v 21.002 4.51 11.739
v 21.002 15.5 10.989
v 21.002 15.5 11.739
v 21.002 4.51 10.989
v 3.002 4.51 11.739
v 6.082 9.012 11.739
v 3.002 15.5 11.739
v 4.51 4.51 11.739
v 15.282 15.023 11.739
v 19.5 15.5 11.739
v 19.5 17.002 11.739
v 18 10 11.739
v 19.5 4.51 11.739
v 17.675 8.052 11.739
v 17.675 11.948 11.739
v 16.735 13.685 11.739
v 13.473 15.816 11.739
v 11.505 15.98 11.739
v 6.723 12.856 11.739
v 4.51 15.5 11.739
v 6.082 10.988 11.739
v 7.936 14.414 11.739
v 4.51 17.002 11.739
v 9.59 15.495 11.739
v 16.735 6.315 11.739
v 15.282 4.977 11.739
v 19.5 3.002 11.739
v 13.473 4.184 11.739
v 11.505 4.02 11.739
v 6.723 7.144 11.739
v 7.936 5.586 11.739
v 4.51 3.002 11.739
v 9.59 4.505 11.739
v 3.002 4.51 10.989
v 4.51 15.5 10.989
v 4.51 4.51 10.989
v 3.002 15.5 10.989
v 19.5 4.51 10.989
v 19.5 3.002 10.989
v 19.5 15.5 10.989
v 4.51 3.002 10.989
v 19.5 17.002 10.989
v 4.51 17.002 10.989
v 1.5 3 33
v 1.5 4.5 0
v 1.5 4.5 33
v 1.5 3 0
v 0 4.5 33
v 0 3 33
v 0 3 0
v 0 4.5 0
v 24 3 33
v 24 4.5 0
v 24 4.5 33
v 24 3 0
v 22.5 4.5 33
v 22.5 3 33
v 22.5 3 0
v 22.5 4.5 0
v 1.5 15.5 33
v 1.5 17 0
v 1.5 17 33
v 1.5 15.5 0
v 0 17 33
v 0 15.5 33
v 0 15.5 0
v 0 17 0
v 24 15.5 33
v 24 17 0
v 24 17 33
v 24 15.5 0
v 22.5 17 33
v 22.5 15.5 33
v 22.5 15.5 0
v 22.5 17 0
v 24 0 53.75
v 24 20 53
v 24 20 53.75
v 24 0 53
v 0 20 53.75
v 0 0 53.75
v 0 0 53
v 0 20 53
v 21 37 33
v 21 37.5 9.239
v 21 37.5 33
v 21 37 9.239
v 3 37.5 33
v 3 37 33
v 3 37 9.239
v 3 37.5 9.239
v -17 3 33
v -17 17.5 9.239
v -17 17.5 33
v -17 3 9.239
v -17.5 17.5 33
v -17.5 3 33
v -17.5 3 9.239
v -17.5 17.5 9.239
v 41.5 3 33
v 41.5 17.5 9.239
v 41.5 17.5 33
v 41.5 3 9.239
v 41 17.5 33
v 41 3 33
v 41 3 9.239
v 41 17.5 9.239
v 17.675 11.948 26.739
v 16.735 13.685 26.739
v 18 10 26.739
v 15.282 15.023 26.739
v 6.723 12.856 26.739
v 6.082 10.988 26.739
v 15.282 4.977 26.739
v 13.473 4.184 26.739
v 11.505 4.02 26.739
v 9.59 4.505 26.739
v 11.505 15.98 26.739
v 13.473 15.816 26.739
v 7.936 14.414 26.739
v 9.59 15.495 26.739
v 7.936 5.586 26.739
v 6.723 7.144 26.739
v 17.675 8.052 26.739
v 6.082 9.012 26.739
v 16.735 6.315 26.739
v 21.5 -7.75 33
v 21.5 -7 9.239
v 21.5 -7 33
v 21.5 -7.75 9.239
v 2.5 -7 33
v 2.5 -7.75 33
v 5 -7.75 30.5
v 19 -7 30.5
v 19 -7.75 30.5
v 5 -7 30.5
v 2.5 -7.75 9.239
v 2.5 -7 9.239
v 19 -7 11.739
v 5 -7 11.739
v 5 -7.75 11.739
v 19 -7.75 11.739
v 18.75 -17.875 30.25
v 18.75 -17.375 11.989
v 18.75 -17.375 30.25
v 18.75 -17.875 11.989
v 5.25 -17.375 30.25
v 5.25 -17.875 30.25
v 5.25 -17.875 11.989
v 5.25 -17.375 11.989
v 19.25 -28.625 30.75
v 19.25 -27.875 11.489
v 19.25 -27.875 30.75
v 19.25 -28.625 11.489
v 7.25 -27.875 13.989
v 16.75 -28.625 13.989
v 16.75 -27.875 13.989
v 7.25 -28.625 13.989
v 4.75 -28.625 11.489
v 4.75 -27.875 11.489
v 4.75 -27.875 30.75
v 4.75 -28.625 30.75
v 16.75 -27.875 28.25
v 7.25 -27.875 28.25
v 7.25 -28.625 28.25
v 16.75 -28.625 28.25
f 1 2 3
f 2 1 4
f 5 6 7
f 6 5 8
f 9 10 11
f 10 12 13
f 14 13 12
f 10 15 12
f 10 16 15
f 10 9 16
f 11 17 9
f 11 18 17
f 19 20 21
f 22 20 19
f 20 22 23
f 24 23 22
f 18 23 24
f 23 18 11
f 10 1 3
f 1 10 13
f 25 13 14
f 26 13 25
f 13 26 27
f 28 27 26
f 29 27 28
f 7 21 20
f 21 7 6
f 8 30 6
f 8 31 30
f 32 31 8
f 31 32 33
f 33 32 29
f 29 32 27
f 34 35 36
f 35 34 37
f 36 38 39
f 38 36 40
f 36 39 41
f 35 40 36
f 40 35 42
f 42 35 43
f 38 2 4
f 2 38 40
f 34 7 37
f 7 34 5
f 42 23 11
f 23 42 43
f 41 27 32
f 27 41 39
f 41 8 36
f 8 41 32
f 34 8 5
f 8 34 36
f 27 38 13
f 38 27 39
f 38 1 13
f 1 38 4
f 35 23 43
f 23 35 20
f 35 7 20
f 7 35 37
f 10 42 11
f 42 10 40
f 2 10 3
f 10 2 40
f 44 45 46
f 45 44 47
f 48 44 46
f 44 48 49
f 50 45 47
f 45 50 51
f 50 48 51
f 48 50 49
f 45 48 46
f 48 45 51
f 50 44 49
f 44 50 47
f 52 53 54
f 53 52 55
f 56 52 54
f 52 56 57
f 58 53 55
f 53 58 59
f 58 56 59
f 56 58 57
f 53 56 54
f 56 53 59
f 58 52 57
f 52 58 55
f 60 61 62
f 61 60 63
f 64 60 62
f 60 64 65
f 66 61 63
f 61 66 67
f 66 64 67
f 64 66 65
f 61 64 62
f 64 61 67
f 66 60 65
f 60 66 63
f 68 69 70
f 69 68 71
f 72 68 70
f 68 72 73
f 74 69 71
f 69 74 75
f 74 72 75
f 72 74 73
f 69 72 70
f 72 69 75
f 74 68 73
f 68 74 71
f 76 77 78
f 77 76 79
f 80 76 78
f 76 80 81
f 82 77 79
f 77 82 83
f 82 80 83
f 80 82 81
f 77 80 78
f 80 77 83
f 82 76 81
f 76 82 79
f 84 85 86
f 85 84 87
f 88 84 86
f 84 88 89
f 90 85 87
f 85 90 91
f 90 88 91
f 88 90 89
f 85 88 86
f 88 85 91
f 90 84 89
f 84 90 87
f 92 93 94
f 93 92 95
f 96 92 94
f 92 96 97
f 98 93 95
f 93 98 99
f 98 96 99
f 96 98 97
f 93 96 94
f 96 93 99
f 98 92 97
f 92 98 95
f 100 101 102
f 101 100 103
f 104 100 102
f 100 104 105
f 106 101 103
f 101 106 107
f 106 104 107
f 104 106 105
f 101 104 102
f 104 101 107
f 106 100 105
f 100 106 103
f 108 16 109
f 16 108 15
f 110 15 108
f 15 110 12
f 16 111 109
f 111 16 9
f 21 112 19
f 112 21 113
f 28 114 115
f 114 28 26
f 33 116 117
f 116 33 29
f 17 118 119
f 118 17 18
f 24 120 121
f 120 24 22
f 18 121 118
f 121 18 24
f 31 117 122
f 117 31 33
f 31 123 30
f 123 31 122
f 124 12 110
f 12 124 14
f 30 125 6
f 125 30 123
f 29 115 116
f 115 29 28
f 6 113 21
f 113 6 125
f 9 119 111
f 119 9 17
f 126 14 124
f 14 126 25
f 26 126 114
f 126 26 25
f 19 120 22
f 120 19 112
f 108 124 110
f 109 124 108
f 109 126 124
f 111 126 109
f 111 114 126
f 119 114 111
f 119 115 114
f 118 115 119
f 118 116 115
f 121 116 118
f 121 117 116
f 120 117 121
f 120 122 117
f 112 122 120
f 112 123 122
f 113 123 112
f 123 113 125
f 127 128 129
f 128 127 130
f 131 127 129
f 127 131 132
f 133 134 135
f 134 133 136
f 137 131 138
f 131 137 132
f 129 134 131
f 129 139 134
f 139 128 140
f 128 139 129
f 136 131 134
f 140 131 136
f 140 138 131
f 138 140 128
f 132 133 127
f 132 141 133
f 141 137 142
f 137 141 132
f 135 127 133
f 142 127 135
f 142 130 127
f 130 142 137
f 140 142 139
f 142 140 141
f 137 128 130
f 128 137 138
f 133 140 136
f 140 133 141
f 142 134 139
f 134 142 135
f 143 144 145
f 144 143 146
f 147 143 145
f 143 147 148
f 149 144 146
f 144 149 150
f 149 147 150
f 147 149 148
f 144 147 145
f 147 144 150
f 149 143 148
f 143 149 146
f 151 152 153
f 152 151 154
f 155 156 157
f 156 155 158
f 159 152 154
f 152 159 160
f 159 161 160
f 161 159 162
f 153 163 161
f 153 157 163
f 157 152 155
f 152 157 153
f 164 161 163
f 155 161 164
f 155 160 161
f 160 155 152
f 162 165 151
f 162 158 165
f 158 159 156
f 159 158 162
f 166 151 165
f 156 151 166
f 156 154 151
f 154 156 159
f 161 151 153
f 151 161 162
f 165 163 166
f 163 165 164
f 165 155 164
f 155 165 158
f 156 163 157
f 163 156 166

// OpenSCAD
h=33;   // height
w=24;   // width
d=20;   //depth
/* [Hidden] */
lt=1.5; // leg thickness
o=3;    // leg offset

//leg1 front left
translate([o-3,o,0])
    cube([lt,lt,h]);
    
//leg2 front right
translate([w-o+3-lt,o,0])
    cube([lt,lt,h]);
    
//leg3 rear left
translate([o-3,d-o-lt,0])
    cube([lt,lt,h]);
    
//leg4 rear right
translate([w-o+3-lt,d-o-lt,0])
    cube([lt,lt,h]);
    echo("Legs are" ,h, "inches long made with 2 by 2 inch lumber");

//top
translate([0,0,h+20])
    cube([w,d,0.75]);
    echo("Top is ",w," inches wide by ",d," inches deep made with 3/4 inch plywood");
    
//back
translate([o,d-o+20,0.333*h-1.75])
    color([1,0,0])
    cube([w-2*o,0.5,h*0.667+1.75]);
    echo("Back is ",w-2*o,"w by ",h*0.667+2," inches h made with 1/2 inch plywood");
    
//left side
translate([o-0.5-20,o,0.333*h-1.75])
    color([0,0,1])
    cube([0.5,d-2*o+0.5,h*0.667+1.75]);
    echo("Left side and Right side are ",d-2*o+0.5,"w by ",h*0.667+2," inches h made with 1/2 inch plywood");
    
//right side
translate([w-o+20,o,0.333*h-1.75])
    color([0,0,1])
    cube([0.5,d-2*o+0.5,h*0.667+1.75]);
    
    
//bottom with legs cut out
difference()
{
translate([o+.002,o+.002,0.333*h])
    color([0,1,0])
    //bottom
    cube([w-o*2,d-o*2,0.75]);
    echo("Bottom is ",w-o*2,"w by ",d-0*2,"d with 1.5 inch by 1.5 inch cutouts on each corner made with 3/4 inch plywood");
translate([o,o,0])
    //cut out front left leg
    cube([lt+.01,lt+.01,h]);
translate([w-o-lt,o,0])
    //cut out front right leg
    cube([lt+.01,lt+.01,h]);
translate([o,d-o-lt,0])
    //cut out rear left leg
    cube([lt+.01,lt+.01,h]);
translate([w-o-lt,d-o-lt,0])
    //cut out rear right leg
    cube([lt+.01,lt+.01,h]);    
}


translate([w/2,d/2,0.333*h+0.75])
    // wheat berries container
    cylinder(h=15,d=12);
    echo("Wheat berries container is 5-gallon container that is 12 inches in diameter by 15 inches in height");
translate([o-0.5,o-0.75-10,h-2.5])
    color([1,0,1])
    // upper horizontal face frame
    cube([w-2*o+1,0.75,2.5]);

translate([o-0.5,o-0.75-10,0.333*h-1.75])
    color([1,0,1])
    // lower horizontal face frame
    cube([w-2*o+1,0.75,2.5]);
    echo("Upper and lower horizontal face frames are ",w-2*o+1," inches long made with 1 by 3 inch lumber");

translate([o-0.5,o-0.75-10,0.333*h+0.75])
    color([1,0,1])
    // left vertical face frame
    cube([2.5,0.75,h-2.5-(0.333*h+0.75)]);
    
translate([w-o-2,o-0.75-10,0.333*h+0.75])
    color([1,0,1])
    // right vertical face frame
    cube([2.5,0.75,h-2.5-(0.333*h+0.75)]);
    echo("Left and right vertical face frames are ",h-2.5-(0.333*h+0.75)," inches long made with 1 by 3 inch lumber");
translate([o+2.25,o-0.875-20,0.333*h+1])
    color([0,1,1])
    // door insert
    cube([w-2*o-4.5,0.5,h-0.333*h-3.75]);
    echo("Door insert is ",w-2*o-4.5," inches wide by",h-0.333*h-3.75," inches in height made with 1/2 inch plywood");
translate([o+1.75,o-1.625-30,0.333*h+0.5])
    color([1,0,0])
    // door lower horizontal frame
    cube([w-2*o-3.5,0.75,2.5]);
   
translate([o+1.75,o-1.625-30,h-4.75])
    color([1,0,0])
    // door upper horizontal frame
    cube([w-2*o-3.5,0.75,2.5]);
    echo("Door upper and lower horizontal frames are ",w-2*o-3.5," inches long made with 1 by 3 inch lumber");
translate([o+1.75,o-1.625-30,0.333*h+3])
    color([1,0,0])
    // door left vertical frame
    cube([2.5,0.75,h-0.333*h-7.75]);
    
translate([w-o-4.25,o-1.625-30,0.333*h+3])
    color([1,0,0])
    // door right vertical frame
    cube([2.5,0.75,h-0.333*h-7.75]);
    echo("Door left and right vertical frames are ",h-0.333*h-7.75," inches long made with 1 by 3 inch lumber");
    
    



    
